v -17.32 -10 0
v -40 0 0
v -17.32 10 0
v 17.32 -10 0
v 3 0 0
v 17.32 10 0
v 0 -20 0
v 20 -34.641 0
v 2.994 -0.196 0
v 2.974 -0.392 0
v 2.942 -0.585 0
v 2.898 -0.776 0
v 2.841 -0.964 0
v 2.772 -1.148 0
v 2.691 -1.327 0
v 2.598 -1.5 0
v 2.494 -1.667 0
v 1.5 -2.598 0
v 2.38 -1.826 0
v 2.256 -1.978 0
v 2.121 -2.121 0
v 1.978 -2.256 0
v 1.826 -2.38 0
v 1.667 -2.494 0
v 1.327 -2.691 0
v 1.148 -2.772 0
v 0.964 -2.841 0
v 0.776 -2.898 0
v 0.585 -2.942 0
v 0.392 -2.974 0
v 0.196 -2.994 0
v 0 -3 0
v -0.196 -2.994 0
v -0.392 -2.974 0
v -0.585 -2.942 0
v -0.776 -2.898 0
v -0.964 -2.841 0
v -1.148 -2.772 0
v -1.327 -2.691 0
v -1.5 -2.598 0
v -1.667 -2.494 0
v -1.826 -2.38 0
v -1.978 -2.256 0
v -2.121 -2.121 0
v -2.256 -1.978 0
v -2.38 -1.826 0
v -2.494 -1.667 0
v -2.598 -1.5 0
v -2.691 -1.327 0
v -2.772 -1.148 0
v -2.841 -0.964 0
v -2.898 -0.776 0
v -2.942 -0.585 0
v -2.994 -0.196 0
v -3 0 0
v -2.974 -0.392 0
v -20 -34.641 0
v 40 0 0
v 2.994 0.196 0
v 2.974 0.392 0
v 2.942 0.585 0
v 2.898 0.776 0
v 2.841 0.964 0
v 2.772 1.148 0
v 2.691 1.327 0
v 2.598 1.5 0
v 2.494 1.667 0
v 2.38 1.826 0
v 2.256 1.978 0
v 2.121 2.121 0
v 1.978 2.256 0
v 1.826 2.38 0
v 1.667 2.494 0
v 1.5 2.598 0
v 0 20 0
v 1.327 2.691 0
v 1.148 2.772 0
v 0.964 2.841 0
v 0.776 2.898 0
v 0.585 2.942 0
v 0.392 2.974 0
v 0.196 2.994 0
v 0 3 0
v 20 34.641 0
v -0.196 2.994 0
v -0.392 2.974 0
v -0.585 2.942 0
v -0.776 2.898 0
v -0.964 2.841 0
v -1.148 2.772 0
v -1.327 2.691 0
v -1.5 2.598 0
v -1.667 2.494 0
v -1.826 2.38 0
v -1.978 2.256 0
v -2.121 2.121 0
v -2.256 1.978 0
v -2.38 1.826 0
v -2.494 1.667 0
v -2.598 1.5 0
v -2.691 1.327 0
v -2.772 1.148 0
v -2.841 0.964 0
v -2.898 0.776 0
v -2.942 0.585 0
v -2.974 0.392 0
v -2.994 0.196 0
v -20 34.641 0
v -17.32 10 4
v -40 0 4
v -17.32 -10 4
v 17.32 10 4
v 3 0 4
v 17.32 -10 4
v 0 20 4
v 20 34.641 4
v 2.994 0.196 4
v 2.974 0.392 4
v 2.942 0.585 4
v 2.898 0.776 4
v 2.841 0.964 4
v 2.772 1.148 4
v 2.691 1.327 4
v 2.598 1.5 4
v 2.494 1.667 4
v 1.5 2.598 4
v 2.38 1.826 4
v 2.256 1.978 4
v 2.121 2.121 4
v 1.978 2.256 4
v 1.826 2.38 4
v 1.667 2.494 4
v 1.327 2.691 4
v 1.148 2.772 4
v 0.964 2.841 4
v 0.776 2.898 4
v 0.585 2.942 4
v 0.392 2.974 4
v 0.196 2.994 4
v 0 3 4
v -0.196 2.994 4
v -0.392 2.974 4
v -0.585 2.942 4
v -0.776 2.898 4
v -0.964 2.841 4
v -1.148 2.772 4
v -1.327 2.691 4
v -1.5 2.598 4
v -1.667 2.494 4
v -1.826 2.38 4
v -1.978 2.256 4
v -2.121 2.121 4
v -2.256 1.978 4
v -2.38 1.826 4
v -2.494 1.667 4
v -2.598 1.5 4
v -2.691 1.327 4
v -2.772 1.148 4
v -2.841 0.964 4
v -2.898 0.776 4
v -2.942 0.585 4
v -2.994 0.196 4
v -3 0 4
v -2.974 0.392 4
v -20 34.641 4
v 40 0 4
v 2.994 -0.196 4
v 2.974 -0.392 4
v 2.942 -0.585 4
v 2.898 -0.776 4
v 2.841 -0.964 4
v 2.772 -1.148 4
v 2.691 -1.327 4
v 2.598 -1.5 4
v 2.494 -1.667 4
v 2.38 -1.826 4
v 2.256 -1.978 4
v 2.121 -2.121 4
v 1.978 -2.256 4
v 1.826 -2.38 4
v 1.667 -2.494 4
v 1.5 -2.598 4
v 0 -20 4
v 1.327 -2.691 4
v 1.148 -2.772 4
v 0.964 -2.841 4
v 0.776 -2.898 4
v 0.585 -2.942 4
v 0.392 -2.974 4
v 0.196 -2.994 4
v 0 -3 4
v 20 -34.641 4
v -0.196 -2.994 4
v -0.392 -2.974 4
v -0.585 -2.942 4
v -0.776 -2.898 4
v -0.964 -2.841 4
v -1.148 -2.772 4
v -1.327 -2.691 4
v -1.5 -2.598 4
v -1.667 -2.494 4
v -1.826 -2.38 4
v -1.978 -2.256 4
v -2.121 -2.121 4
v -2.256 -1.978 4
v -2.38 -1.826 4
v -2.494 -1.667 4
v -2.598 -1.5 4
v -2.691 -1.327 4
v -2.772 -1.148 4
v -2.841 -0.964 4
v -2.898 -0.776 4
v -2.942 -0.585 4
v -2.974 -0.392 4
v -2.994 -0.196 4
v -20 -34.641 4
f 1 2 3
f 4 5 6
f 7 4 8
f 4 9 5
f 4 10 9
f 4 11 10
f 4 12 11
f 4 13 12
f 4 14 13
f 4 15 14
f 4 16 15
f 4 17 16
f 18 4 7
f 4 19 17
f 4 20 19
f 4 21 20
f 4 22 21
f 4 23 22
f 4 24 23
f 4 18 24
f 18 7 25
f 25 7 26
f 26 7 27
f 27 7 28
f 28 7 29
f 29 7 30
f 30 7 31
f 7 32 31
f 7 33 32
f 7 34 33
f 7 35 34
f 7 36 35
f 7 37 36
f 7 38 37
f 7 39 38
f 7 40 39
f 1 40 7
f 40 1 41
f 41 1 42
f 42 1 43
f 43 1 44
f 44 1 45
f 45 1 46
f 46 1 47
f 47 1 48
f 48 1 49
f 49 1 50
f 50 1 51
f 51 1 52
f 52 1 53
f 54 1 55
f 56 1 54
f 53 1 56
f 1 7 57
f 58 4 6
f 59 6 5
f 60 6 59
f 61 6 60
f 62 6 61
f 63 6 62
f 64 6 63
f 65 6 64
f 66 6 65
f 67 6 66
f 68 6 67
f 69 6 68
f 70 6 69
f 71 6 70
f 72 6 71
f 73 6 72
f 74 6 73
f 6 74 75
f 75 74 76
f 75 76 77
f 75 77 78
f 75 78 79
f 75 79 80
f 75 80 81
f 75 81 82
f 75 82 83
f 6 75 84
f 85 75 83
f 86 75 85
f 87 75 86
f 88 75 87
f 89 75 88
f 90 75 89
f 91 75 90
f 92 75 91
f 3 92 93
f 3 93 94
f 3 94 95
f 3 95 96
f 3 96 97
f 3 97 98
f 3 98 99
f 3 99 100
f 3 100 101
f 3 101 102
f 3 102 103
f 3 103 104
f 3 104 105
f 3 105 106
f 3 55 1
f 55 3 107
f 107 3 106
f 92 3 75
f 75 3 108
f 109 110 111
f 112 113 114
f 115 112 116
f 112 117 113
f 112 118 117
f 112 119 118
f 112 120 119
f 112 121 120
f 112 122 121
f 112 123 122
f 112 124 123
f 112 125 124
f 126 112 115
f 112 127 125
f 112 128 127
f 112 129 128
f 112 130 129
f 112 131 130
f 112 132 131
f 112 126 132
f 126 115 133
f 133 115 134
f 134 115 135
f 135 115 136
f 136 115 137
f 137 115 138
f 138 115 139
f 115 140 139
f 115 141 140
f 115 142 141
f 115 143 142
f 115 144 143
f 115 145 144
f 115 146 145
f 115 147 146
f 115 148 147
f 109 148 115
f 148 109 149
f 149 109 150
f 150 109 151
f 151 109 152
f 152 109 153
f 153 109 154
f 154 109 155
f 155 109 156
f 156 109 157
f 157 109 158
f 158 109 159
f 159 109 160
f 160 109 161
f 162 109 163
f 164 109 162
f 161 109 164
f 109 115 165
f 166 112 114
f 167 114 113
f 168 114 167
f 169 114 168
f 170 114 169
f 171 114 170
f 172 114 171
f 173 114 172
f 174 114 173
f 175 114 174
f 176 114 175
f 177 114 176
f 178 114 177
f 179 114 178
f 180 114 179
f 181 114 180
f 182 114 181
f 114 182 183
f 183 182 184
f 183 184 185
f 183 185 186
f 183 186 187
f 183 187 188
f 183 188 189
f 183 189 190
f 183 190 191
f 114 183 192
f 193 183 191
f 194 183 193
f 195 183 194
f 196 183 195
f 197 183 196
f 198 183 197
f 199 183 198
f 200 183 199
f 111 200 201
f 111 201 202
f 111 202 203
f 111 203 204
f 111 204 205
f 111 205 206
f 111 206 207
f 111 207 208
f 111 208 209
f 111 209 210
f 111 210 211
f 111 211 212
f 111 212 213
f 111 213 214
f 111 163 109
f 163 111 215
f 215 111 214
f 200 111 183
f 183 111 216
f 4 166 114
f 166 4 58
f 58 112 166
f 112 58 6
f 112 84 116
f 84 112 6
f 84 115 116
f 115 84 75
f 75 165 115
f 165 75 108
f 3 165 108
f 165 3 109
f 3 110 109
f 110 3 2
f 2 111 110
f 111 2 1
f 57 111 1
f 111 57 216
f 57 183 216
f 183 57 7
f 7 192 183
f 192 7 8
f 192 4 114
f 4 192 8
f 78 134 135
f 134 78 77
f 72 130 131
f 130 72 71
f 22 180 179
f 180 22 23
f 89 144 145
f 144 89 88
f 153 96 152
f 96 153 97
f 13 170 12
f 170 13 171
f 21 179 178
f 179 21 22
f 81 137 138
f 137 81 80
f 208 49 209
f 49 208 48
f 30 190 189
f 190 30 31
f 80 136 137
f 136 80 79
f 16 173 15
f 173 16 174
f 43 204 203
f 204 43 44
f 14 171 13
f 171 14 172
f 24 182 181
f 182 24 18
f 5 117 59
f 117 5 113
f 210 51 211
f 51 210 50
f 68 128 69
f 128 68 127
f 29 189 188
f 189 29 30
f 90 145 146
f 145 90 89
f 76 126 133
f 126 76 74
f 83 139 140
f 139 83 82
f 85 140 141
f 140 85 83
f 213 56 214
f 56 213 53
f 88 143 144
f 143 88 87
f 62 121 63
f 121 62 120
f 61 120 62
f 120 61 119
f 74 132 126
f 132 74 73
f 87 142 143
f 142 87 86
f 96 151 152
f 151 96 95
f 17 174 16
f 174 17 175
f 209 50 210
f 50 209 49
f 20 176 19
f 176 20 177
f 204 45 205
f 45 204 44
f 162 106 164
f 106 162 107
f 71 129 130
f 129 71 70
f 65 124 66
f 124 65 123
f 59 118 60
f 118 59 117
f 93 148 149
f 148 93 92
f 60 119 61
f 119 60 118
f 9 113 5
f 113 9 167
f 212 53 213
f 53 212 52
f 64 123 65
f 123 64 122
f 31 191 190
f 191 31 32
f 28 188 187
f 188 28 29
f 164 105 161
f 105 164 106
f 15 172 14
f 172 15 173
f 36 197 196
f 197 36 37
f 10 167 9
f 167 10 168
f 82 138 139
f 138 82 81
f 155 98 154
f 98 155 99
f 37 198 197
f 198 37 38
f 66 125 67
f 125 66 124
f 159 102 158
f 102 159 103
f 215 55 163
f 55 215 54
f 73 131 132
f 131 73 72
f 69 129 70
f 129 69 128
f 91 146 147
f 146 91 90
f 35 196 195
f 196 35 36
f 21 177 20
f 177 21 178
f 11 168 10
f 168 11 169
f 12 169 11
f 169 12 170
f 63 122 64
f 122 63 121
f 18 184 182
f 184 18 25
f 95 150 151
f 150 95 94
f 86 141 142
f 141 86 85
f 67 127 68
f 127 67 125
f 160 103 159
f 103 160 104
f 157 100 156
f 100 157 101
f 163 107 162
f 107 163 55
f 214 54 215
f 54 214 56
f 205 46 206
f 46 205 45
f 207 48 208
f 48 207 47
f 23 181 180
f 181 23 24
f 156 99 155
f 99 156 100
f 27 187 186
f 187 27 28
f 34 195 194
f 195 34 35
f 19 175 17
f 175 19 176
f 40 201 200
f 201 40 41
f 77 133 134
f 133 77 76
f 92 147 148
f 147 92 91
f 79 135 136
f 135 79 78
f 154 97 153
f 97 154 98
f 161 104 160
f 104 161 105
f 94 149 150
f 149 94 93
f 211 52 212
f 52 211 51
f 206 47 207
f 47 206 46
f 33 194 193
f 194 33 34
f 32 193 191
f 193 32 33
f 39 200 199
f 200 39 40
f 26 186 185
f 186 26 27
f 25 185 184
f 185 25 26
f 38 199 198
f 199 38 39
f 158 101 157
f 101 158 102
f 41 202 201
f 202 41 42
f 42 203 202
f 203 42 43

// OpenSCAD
// Star-shaped indexing wheel (6-pointed star plate)

// ---- Parameters ----
n_points   = 6;    // number of star points
r_outer    = 40;   // radius of outer (tip) points, mm
r_inner    = 20;   // radius of inner (valley) points, mm
thickness  = 4;    // plate thickness, mm
hole_d     = 6;    // centre through-hole diameter, mm
cut_extra  = 0.5;  // overshoot for cutting shapes, mm
$fn        = 96;   // facet count for curved shapes

// ---- Star outline points ----
// Alternates outer/inner, first outer point on +X axis
star_pts = [
    for (i = [0 : 2 * n_points - 1])
        let (r = (i % 2 == 0) ? r_outer : r_inner,
             a = i * 180 / n_points)
        [r * cos(a), r * sin(a)]
];

// ---- Part ----
difference() {
    linear_extrude(height = thickness)
        polygon(star_pts);

    translate([0, 0, -cut_extra])
        cylinder(d = hole_d, h = thickness + 2 * cut_extra);
}
